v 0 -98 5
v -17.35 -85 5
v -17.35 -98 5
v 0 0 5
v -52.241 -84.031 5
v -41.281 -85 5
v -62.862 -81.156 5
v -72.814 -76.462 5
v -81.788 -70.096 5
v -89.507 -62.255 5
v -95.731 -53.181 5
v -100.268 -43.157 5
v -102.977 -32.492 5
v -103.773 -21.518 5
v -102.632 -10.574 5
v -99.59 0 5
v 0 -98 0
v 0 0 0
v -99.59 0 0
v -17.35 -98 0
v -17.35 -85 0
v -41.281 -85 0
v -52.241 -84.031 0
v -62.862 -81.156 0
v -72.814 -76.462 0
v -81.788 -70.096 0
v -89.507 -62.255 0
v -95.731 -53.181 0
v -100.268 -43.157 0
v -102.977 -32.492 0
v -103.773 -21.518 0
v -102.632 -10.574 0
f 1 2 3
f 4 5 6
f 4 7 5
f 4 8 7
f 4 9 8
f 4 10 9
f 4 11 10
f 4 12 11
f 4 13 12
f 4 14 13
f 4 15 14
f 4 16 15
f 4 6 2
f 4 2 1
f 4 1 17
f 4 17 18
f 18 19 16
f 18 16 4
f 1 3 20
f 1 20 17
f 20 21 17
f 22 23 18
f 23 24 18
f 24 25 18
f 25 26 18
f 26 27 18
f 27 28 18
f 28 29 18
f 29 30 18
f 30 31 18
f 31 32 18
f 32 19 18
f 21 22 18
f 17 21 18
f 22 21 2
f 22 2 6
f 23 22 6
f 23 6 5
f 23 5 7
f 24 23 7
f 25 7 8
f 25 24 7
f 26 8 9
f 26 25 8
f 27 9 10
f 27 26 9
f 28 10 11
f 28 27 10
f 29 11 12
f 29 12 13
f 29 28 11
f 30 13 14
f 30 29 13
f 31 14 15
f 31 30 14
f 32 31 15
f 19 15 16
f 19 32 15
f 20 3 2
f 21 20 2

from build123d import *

# Parameters (mm, degrees)
BOSS_EXTRUDE1_DEPTH = 5
SKETCH2_W           = 17.35
SKETCH2_H           = 13
BOSS_EXTRUDE2_DEPTH = 5


with BuildPart() as part:
    # Sketch1 → Boss-Extrude1 (new body)
    with BuildSketch(Plane.XY):
        with BuildLine():
            Line((0, 0), (0, -85))
            Line((0, -85), (-41.280574715, -85))
            ThreePointArc((-41.280574715, -85), (-92.819395035, -57.855339059), (-99.590093663, 0))
            Line((-99.590093663, 0), (0, 0))
        make_face()
    extrude(amount=BOSS_EXTRUDE1_DEPTH)

    # Sketch2 → Boss-Extrude2 (add)
    with BuildSketch(Plane.XY.offset(5)):
        with Locations((-8.675, -91.5)):
            Rectangle(SKETCH2_W, SKETCH2_H)
    extrude(amount=-BOSS_EXTRUDE2_DEPTH)


solid = part.part
